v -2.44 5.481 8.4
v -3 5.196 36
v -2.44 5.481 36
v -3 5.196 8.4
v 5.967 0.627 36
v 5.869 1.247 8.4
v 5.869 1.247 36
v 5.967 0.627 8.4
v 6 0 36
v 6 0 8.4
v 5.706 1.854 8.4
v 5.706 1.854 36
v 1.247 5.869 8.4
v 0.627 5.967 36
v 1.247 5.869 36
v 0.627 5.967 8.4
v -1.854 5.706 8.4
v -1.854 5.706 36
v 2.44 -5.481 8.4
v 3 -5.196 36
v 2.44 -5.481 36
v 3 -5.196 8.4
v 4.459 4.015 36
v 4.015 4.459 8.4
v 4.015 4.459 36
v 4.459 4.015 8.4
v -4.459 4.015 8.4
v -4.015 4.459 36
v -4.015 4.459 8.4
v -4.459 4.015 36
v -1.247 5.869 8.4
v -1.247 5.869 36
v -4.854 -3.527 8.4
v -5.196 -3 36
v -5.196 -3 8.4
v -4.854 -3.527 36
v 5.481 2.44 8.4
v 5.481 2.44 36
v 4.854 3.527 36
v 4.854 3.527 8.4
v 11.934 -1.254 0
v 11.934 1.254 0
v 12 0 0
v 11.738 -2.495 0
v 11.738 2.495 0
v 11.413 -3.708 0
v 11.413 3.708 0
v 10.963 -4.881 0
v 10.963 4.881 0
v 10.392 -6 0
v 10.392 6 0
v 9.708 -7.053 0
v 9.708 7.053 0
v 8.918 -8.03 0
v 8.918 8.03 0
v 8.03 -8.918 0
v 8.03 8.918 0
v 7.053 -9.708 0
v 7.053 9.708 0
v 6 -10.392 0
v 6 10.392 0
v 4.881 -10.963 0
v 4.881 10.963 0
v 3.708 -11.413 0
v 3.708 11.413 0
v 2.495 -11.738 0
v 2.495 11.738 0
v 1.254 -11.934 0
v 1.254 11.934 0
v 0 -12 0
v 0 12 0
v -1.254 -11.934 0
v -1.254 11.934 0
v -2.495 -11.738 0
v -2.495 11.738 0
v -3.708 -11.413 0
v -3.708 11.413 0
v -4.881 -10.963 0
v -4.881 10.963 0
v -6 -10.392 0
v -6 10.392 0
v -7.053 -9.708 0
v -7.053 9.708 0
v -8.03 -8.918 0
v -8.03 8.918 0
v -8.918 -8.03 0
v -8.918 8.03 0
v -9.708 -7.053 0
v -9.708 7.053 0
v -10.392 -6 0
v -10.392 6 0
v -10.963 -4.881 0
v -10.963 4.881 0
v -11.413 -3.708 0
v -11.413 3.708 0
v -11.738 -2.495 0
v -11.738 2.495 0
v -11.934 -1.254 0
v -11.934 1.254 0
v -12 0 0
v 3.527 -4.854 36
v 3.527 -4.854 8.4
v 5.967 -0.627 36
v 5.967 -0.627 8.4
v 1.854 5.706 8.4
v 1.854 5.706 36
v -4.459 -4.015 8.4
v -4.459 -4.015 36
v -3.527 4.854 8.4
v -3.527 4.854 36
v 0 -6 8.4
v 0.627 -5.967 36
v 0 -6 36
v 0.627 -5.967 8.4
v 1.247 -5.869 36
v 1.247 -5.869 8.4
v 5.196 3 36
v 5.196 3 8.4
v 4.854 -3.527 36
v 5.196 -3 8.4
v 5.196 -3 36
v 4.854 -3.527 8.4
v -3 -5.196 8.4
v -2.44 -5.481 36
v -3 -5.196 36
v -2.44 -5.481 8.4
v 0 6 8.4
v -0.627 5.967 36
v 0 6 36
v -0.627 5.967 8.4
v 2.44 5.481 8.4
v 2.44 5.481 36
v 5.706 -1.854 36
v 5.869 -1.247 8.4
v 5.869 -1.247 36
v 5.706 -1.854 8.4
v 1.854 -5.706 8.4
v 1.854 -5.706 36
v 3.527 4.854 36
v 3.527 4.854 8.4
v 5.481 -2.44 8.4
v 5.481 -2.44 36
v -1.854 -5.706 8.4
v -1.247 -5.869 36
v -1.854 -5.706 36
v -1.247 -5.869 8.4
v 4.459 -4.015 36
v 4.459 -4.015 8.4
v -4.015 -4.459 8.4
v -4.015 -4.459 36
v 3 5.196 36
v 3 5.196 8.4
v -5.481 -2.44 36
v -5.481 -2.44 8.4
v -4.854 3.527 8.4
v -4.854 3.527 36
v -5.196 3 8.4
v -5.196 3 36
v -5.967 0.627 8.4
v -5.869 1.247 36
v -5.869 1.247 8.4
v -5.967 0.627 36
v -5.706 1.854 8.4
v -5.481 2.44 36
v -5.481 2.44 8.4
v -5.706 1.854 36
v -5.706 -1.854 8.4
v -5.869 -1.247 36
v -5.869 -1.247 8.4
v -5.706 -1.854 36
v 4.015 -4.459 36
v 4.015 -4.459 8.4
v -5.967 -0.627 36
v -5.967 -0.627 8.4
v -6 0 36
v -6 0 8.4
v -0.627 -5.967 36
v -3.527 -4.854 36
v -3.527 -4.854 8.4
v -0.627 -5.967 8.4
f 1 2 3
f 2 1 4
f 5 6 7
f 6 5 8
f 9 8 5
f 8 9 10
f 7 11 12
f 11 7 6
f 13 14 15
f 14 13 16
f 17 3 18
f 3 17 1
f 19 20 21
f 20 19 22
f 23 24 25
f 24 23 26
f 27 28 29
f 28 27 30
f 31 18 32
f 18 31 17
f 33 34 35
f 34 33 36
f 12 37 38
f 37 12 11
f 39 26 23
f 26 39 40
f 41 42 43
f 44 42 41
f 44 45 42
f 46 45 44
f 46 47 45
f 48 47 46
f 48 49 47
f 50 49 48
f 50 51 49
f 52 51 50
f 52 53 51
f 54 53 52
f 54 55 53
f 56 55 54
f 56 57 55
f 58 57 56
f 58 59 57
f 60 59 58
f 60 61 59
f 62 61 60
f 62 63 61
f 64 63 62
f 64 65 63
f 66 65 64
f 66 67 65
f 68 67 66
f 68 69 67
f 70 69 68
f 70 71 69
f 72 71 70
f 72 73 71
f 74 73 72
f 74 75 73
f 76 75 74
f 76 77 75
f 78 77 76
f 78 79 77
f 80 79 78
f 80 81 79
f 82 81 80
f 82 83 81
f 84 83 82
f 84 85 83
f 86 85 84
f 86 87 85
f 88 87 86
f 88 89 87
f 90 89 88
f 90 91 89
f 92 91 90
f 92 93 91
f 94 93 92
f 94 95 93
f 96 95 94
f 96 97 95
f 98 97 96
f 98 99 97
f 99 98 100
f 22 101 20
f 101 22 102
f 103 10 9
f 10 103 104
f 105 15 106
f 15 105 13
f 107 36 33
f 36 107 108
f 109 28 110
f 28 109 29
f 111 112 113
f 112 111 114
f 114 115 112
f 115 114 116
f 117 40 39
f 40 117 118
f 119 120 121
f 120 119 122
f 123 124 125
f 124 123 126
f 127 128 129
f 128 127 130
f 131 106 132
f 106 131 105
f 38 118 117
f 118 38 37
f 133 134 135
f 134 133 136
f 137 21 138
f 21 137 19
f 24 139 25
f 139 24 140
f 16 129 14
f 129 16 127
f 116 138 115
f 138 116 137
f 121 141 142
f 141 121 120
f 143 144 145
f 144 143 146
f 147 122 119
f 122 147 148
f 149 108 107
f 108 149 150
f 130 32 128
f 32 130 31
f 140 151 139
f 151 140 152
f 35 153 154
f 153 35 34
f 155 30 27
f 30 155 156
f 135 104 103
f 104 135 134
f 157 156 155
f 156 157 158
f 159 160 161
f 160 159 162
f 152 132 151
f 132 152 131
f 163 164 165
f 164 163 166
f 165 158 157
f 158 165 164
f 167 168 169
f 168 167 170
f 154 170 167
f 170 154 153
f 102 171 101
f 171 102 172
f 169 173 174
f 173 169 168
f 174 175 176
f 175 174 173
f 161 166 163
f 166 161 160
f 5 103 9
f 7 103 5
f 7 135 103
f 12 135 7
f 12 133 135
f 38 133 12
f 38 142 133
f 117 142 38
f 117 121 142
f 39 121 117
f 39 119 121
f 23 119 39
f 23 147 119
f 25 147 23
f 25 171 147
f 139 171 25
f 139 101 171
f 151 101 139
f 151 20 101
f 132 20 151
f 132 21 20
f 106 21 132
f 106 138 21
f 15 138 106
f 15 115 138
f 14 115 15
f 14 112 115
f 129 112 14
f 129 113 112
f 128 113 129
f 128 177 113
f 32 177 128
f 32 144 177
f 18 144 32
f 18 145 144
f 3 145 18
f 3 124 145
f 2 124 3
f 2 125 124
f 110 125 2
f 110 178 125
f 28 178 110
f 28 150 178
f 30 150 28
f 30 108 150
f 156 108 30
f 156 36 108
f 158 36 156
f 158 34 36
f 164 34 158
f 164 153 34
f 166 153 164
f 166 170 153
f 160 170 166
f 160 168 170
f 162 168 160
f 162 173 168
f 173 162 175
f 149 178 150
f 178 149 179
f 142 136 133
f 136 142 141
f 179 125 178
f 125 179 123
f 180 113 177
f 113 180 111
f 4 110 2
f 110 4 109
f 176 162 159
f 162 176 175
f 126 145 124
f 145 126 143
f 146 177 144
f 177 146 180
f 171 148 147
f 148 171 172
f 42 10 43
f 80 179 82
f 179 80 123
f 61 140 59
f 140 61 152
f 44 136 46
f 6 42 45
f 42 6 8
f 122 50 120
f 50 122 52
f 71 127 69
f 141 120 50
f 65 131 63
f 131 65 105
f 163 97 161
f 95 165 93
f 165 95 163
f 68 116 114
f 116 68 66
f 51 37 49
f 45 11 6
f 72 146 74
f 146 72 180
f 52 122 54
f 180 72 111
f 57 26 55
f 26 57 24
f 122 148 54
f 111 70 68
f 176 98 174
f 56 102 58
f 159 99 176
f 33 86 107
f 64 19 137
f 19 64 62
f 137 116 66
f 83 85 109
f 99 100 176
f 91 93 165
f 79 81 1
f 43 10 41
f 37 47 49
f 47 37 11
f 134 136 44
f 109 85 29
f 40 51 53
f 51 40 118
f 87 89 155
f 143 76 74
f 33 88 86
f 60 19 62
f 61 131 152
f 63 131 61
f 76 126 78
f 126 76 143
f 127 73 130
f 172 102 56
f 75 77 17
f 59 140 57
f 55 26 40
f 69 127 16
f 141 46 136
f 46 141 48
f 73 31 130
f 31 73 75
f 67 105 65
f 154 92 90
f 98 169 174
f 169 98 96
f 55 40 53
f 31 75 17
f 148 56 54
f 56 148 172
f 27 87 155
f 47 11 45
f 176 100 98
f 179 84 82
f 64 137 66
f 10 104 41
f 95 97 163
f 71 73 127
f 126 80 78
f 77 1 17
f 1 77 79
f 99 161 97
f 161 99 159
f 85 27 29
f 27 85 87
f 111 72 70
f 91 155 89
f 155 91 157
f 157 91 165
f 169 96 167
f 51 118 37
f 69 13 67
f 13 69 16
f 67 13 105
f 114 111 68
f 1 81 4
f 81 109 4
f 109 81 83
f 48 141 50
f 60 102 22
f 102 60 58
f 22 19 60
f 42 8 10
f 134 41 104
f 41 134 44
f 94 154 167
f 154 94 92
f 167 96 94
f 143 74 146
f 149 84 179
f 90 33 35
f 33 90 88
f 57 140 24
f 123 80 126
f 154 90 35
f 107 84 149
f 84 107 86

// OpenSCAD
// Solid rivet.
$fn = 60;
eps = 0.02;
shank_d = 12;
head_d = 24;
length = 36;
union() { cylinder(d=shank_d,h=length); cylinder(d1=head_d,d2=shank_d,h=head_d*0.35); }
